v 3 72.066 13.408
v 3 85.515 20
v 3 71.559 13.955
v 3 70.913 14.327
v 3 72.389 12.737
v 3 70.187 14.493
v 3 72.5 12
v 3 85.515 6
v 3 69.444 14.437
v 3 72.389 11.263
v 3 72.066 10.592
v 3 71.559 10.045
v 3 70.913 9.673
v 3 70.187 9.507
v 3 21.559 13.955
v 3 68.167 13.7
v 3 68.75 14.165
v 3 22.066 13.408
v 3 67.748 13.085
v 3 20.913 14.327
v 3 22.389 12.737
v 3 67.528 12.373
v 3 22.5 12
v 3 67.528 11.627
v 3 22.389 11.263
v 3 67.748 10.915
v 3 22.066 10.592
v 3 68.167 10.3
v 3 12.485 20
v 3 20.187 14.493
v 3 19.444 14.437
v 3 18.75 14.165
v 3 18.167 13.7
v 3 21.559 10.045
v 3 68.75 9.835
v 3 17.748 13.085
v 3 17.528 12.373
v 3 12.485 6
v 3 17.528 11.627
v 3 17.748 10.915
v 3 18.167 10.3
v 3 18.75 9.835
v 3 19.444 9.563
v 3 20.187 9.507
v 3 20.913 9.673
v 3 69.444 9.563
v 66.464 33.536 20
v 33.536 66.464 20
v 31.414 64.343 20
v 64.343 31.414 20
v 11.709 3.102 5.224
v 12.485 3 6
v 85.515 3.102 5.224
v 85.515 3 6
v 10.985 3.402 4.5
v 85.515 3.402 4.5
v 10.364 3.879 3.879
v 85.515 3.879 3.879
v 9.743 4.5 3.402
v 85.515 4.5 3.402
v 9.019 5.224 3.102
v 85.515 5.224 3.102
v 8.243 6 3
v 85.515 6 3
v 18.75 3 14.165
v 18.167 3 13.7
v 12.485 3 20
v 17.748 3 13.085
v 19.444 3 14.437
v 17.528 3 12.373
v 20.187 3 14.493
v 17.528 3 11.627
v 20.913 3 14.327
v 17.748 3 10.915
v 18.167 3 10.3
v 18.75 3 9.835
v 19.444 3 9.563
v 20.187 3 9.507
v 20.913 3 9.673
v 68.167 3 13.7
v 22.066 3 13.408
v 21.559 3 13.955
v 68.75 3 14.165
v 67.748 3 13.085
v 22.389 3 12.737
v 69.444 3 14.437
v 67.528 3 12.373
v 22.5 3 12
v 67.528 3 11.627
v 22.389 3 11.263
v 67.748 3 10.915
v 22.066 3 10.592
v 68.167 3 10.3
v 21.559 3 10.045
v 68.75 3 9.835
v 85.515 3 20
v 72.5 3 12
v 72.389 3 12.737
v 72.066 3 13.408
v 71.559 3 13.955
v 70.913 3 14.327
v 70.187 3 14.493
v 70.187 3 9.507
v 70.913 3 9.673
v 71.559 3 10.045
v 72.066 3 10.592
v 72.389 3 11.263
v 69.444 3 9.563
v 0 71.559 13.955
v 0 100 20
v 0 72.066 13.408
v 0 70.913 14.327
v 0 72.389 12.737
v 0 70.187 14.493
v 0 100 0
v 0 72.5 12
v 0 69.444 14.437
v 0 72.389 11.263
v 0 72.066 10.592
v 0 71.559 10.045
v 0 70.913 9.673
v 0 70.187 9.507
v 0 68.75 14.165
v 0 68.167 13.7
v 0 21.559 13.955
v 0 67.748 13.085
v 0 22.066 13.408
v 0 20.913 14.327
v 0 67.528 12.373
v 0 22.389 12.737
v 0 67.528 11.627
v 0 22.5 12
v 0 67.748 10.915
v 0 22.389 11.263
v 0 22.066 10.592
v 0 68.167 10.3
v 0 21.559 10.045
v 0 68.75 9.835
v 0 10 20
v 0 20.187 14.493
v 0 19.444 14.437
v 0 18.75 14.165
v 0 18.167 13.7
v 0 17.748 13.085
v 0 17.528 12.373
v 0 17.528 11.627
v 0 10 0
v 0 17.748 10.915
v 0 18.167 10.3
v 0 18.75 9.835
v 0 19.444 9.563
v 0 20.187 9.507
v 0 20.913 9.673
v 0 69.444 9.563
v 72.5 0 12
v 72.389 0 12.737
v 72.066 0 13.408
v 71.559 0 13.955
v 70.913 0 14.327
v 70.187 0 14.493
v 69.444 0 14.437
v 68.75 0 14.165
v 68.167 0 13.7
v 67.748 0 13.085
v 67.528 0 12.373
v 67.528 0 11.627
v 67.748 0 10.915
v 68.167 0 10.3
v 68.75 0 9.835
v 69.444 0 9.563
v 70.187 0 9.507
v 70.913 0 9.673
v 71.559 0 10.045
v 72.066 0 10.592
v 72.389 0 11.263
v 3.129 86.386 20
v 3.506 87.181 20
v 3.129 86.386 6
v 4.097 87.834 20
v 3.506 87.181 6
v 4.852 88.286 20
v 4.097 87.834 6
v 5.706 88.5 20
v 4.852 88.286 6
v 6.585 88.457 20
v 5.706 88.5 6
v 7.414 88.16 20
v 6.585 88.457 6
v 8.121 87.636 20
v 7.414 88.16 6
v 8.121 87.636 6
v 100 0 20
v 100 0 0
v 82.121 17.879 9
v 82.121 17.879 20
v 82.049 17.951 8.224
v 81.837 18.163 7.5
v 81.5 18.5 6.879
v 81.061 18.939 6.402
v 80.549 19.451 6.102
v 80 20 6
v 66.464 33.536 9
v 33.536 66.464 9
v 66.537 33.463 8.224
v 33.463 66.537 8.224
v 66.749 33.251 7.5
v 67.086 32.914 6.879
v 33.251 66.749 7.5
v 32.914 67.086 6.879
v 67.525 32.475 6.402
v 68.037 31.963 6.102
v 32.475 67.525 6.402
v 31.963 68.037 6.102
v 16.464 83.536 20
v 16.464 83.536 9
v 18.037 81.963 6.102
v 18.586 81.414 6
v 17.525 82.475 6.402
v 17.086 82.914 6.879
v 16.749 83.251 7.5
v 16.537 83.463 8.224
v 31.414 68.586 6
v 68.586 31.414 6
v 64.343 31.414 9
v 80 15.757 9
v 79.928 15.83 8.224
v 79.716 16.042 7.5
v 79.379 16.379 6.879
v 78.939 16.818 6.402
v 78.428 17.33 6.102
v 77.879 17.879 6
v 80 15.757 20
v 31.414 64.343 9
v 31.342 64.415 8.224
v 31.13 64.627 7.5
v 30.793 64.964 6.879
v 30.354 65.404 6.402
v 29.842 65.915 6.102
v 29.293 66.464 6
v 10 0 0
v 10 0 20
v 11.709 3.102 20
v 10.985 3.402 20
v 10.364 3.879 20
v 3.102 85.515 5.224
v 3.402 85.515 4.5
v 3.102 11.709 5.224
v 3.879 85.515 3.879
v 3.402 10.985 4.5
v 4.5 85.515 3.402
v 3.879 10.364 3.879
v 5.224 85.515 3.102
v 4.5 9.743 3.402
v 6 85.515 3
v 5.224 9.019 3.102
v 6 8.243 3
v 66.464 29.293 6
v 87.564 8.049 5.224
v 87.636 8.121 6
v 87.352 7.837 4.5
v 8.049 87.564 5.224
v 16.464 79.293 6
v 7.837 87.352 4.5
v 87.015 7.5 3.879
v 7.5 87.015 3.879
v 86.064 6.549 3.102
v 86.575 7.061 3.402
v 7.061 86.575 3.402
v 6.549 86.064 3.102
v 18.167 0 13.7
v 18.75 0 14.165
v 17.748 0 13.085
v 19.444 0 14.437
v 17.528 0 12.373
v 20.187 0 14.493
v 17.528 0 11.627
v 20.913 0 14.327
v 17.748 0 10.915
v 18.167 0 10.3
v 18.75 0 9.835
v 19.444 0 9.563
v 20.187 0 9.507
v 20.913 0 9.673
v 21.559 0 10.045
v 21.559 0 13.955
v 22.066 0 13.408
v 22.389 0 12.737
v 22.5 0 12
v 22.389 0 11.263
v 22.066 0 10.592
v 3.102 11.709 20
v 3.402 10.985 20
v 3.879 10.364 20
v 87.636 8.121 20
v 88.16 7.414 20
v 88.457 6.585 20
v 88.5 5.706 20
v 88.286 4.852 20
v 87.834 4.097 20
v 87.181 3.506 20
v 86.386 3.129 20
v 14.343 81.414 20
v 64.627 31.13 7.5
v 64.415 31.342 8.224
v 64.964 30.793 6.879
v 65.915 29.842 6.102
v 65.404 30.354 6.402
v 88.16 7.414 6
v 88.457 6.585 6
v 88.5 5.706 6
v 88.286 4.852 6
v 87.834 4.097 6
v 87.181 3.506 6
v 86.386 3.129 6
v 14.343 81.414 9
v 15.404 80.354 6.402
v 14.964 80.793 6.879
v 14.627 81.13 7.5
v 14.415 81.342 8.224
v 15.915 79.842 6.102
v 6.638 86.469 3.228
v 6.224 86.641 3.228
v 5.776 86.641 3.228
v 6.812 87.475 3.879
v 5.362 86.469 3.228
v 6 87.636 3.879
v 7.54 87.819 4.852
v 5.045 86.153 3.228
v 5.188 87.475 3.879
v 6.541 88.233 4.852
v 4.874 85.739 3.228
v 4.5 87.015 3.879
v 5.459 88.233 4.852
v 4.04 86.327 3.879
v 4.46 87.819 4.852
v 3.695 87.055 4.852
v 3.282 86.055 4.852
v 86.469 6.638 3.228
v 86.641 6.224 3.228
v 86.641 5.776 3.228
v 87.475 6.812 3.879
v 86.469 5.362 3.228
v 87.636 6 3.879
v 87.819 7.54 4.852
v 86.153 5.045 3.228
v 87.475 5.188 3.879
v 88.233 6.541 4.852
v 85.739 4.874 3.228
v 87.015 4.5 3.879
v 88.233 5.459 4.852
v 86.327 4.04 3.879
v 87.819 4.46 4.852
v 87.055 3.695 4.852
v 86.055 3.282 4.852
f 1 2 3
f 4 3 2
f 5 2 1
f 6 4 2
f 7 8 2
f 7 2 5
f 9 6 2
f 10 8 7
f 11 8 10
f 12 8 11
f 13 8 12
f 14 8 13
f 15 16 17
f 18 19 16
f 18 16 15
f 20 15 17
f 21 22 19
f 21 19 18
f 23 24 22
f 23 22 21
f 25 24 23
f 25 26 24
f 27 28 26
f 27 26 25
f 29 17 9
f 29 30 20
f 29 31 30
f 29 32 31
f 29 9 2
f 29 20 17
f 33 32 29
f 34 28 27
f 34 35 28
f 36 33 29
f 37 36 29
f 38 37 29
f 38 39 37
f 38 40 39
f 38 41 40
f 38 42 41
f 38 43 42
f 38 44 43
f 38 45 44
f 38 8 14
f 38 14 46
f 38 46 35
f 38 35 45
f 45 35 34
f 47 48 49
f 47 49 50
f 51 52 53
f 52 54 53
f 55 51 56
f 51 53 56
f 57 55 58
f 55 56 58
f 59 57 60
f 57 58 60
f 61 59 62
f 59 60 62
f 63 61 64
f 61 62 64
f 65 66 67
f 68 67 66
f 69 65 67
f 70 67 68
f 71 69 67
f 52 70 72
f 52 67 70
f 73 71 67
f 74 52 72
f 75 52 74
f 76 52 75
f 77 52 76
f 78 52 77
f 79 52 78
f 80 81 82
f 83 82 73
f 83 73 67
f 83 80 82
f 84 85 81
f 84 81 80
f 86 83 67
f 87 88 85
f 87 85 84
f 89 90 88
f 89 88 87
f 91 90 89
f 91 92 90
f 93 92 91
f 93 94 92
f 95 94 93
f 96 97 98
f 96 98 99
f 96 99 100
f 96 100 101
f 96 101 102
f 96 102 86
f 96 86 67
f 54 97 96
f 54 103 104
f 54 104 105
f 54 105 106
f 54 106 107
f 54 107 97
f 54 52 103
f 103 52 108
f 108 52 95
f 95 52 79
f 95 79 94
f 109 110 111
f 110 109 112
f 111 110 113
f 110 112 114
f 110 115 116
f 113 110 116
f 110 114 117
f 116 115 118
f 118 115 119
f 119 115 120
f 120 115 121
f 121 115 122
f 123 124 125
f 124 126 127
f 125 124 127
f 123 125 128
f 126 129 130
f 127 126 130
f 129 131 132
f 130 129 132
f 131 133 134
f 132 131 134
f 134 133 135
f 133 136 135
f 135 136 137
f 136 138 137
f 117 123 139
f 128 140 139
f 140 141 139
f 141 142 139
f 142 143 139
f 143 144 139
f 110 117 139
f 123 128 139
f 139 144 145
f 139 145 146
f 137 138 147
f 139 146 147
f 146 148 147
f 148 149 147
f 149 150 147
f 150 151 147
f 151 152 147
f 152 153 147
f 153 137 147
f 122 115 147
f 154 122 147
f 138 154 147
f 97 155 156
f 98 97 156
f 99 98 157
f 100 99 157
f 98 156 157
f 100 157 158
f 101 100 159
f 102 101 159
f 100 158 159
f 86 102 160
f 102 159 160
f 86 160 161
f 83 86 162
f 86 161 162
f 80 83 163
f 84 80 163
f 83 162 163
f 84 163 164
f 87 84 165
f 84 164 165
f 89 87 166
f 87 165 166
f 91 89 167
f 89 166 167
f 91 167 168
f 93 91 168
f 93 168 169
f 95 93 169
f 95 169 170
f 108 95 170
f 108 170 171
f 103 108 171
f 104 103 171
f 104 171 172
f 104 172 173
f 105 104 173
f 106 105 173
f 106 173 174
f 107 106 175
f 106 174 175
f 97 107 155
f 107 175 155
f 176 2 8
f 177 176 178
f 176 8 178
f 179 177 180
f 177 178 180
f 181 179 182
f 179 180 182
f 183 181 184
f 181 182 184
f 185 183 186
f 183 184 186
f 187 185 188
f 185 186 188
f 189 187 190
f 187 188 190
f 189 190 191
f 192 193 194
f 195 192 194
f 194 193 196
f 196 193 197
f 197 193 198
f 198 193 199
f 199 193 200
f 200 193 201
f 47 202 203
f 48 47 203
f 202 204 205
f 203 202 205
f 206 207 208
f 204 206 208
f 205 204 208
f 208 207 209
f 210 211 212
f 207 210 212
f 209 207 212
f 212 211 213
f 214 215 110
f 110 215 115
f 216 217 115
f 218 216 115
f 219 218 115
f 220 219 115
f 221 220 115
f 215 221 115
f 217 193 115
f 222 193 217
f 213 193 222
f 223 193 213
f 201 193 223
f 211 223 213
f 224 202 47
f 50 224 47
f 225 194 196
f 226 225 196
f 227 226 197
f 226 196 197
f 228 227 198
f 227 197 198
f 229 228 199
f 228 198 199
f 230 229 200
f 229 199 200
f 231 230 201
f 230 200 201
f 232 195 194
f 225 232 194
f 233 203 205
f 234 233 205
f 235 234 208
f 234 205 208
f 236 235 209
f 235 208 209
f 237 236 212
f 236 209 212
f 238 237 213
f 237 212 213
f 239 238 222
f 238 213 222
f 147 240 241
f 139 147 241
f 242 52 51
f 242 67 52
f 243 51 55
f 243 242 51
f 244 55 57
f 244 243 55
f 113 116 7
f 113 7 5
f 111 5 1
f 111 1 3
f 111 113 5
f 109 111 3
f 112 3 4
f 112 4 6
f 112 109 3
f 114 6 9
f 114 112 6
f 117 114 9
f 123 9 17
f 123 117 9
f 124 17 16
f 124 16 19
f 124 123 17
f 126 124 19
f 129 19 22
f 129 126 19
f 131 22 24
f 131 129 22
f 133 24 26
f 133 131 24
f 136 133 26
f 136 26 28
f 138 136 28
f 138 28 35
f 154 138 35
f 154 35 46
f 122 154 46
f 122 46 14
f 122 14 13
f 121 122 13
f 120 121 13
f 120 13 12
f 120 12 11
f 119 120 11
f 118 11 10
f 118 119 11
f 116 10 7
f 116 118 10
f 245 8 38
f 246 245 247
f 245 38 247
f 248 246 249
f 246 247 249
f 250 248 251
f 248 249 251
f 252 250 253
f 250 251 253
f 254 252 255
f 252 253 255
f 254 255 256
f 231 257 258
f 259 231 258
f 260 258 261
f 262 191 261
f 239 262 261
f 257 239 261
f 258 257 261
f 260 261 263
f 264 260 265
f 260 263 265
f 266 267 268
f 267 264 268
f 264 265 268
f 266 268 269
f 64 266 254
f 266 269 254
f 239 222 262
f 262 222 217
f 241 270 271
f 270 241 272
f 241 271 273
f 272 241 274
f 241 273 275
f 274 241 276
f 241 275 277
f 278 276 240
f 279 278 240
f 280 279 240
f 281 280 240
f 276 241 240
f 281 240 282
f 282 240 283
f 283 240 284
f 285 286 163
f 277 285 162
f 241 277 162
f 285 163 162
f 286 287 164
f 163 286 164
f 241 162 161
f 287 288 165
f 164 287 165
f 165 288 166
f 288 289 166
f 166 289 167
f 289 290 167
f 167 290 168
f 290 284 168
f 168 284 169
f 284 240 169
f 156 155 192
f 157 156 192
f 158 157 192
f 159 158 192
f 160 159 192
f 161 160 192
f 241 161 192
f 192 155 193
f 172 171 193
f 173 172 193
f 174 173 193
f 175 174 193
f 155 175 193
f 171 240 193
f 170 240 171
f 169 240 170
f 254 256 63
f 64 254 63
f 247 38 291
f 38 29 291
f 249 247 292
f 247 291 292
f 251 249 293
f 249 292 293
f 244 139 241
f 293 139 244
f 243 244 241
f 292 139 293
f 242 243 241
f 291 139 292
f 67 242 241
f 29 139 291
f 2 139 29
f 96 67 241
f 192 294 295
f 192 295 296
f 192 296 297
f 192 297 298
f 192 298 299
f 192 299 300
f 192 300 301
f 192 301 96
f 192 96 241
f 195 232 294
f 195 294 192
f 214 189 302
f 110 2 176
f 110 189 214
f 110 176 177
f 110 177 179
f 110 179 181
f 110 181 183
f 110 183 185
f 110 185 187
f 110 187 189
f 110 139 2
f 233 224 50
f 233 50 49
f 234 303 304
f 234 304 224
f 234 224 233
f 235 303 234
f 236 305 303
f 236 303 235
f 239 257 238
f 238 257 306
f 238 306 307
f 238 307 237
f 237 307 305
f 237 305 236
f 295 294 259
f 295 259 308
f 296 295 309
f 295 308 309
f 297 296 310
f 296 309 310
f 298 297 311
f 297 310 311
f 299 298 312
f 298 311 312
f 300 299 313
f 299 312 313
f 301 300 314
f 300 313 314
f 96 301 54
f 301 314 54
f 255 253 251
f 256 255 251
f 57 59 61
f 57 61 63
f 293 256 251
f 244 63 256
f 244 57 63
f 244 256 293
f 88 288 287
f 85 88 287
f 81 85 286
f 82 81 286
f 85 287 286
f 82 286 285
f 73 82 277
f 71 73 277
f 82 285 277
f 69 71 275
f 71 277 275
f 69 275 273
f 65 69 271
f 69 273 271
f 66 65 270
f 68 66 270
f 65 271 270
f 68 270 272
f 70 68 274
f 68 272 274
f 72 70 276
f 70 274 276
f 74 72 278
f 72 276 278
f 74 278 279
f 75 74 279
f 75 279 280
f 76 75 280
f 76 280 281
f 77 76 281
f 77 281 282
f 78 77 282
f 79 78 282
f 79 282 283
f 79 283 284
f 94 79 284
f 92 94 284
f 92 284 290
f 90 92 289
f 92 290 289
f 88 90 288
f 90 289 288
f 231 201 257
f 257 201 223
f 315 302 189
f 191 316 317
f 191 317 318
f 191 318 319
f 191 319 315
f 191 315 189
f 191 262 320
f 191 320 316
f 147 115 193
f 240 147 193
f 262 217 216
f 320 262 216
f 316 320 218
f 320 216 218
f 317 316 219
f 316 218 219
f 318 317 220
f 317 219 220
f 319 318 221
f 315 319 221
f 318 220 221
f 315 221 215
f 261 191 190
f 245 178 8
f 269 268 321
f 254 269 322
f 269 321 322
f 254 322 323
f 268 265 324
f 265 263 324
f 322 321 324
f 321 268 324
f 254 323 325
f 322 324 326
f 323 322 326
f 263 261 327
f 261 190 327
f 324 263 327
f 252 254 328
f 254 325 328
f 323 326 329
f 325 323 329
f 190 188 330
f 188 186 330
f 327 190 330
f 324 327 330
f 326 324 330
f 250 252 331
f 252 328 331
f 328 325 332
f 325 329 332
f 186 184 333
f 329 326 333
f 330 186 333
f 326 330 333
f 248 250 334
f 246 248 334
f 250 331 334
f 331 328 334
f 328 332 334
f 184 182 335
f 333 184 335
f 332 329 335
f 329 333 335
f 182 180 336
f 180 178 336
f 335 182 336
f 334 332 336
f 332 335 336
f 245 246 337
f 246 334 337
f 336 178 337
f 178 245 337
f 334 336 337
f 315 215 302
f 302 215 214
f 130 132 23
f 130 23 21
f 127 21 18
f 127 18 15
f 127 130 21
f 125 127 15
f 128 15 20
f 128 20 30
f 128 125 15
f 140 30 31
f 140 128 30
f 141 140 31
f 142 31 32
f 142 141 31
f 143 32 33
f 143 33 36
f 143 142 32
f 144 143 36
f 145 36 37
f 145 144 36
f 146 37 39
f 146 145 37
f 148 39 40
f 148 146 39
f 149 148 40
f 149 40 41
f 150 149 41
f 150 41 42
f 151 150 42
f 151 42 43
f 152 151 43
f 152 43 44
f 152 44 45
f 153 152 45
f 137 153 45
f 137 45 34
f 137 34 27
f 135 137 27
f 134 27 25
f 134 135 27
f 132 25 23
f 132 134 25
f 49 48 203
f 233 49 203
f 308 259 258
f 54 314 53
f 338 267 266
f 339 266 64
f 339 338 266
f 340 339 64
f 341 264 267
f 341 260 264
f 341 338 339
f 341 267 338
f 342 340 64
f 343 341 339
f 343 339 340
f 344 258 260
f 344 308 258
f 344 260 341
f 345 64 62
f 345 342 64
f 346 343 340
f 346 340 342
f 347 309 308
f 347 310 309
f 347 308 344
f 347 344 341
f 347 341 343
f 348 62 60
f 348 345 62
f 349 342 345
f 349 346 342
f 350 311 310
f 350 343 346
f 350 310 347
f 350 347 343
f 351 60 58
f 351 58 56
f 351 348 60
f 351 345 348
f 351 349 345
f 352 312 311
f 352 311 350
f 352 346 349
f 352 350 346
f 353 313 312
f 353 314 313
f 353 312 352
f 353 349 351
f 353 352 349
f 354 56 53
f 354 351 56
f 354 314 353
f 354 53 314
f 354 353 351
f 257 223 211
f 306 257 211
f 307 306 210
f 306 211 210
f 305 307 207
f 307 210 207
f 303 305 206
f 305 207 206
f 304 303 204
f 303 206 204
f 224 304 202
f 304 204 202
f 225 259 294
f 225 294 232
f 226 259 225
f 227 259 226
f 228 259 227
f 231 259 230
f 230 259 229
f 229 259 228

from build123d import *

# Parameters (mm, degrees)
F1_DEPTH  = 20
F2_SIZE   = 10
F3_T      = -3
F5_R      = 2.5
F6_DEPTH  = 3
F4_R      = 2.5
F7_DEPTH  = 3
F9_R      = 3
F10_DEPTH = 3


with BuildPart() as f1:
    # F0 (on Top) → F1 (new body)
    with BuildSketch(Plane.XY):
        Polygon((0, 100), (0, 0), (100, 0), align=None)
    extrude(amount=F1_DEPTH)

    # F2
    f2_edges = [f1.edges().sort_by_distance(p)[0] for p in [
        (0, 0, 10),
    ]]
    chamfer(f2_edges, length=F2_SIZE)

    # F3
    f3_openings = [f1.faces().sort_by_distance(p)[0] for p in [
        (33.636364, 33.636364, 20),
    ]]
    offset(amount=F3_T, openings=f3_openings)

    # F5 (on Front) → F6 (cut, through all)
    with BuildSketch(Plane.XZ):
        with Locations((20, 12)):
            Circle(F5_R)
        with Locations((70, 12)):
            Circle(F5_R)
    extrude(amount=-F6_DEPTH, mode=Mode.SUBTRACT)

    # F4 (on Right) → F7 (cut, through all)
    with BuildSketch(Plane.YZ):
        with Locations((20, 12)):
            Circle(F4_R)
        with Locations((70, 12)):
            Circle(F4_R)
    extrude(amount=F7_DEPTH, mode=Mode.SUBTRACT)

    # F9
    f9_edges = [f1.edges().sort_by_distance(p)[0] for p in [
        (3, 52, 3),
        (52, 3, 3),
        (92.757359, 3, 11.5),
        (3, 92.757359, 11.5),
        (47.87868, 47.87868, 3),
        (3, 11.242641, 11.5),
        (11.242641, 3, 11.5),
    ]]
    fillet(f9_edges, radius=F9_R)

    # F8 (on face) → F10 (cut, through all)
    with BuildSketch(Plane(origin=(50, 50, 0), x_dir=(-0.7071067812, 0.7071067812, 0), z_dir=(0.7071067812, 0.7071067812, 0))):
        with BuildLine():
            Line((-23.2842712475, 20), (-45.4264068712, 20))
            Line((-45.4264068712, 20), (-45.4264068712, 9))
            ThreePointArc((-45.4264068712, 9), (-44.5477272148, 6.8786796564), (-42.4264068712, 6))
            Line((-42.4264068712, 6), (-26.2842712475, 6))
            ThreePointArc((-26.2842712475, 6), (-24.1629509039, 6.8786796564), (-23.2842712475, 9))
            Line((-23.2842712475, 9), (-23.2842712475, 20))
        make_face()
        with BuildLine():
            Line((47.4264068712, 20), (23.2842712475, 20))
            Line((23.2842712475, 20), (23.2842712475, 9))
            ThreePointArc((23.2842712475, 9), (24.1629509039, 6.8786796564), (26.2842712475, 6))
            Line((26.2842712475, 6), (44.4264068712, 6))
            ThreePointArc((44.4264068712, 6), (46.5477272148, 6.8786796564), (47.4264068712, 9))
            Line((47.4264068712, 9), (47.4264068712, 20))
        make_face()
    extrude(amount=-F10_DEPTH, mode=Mode.SUBTRACT)


solid = f1.part
